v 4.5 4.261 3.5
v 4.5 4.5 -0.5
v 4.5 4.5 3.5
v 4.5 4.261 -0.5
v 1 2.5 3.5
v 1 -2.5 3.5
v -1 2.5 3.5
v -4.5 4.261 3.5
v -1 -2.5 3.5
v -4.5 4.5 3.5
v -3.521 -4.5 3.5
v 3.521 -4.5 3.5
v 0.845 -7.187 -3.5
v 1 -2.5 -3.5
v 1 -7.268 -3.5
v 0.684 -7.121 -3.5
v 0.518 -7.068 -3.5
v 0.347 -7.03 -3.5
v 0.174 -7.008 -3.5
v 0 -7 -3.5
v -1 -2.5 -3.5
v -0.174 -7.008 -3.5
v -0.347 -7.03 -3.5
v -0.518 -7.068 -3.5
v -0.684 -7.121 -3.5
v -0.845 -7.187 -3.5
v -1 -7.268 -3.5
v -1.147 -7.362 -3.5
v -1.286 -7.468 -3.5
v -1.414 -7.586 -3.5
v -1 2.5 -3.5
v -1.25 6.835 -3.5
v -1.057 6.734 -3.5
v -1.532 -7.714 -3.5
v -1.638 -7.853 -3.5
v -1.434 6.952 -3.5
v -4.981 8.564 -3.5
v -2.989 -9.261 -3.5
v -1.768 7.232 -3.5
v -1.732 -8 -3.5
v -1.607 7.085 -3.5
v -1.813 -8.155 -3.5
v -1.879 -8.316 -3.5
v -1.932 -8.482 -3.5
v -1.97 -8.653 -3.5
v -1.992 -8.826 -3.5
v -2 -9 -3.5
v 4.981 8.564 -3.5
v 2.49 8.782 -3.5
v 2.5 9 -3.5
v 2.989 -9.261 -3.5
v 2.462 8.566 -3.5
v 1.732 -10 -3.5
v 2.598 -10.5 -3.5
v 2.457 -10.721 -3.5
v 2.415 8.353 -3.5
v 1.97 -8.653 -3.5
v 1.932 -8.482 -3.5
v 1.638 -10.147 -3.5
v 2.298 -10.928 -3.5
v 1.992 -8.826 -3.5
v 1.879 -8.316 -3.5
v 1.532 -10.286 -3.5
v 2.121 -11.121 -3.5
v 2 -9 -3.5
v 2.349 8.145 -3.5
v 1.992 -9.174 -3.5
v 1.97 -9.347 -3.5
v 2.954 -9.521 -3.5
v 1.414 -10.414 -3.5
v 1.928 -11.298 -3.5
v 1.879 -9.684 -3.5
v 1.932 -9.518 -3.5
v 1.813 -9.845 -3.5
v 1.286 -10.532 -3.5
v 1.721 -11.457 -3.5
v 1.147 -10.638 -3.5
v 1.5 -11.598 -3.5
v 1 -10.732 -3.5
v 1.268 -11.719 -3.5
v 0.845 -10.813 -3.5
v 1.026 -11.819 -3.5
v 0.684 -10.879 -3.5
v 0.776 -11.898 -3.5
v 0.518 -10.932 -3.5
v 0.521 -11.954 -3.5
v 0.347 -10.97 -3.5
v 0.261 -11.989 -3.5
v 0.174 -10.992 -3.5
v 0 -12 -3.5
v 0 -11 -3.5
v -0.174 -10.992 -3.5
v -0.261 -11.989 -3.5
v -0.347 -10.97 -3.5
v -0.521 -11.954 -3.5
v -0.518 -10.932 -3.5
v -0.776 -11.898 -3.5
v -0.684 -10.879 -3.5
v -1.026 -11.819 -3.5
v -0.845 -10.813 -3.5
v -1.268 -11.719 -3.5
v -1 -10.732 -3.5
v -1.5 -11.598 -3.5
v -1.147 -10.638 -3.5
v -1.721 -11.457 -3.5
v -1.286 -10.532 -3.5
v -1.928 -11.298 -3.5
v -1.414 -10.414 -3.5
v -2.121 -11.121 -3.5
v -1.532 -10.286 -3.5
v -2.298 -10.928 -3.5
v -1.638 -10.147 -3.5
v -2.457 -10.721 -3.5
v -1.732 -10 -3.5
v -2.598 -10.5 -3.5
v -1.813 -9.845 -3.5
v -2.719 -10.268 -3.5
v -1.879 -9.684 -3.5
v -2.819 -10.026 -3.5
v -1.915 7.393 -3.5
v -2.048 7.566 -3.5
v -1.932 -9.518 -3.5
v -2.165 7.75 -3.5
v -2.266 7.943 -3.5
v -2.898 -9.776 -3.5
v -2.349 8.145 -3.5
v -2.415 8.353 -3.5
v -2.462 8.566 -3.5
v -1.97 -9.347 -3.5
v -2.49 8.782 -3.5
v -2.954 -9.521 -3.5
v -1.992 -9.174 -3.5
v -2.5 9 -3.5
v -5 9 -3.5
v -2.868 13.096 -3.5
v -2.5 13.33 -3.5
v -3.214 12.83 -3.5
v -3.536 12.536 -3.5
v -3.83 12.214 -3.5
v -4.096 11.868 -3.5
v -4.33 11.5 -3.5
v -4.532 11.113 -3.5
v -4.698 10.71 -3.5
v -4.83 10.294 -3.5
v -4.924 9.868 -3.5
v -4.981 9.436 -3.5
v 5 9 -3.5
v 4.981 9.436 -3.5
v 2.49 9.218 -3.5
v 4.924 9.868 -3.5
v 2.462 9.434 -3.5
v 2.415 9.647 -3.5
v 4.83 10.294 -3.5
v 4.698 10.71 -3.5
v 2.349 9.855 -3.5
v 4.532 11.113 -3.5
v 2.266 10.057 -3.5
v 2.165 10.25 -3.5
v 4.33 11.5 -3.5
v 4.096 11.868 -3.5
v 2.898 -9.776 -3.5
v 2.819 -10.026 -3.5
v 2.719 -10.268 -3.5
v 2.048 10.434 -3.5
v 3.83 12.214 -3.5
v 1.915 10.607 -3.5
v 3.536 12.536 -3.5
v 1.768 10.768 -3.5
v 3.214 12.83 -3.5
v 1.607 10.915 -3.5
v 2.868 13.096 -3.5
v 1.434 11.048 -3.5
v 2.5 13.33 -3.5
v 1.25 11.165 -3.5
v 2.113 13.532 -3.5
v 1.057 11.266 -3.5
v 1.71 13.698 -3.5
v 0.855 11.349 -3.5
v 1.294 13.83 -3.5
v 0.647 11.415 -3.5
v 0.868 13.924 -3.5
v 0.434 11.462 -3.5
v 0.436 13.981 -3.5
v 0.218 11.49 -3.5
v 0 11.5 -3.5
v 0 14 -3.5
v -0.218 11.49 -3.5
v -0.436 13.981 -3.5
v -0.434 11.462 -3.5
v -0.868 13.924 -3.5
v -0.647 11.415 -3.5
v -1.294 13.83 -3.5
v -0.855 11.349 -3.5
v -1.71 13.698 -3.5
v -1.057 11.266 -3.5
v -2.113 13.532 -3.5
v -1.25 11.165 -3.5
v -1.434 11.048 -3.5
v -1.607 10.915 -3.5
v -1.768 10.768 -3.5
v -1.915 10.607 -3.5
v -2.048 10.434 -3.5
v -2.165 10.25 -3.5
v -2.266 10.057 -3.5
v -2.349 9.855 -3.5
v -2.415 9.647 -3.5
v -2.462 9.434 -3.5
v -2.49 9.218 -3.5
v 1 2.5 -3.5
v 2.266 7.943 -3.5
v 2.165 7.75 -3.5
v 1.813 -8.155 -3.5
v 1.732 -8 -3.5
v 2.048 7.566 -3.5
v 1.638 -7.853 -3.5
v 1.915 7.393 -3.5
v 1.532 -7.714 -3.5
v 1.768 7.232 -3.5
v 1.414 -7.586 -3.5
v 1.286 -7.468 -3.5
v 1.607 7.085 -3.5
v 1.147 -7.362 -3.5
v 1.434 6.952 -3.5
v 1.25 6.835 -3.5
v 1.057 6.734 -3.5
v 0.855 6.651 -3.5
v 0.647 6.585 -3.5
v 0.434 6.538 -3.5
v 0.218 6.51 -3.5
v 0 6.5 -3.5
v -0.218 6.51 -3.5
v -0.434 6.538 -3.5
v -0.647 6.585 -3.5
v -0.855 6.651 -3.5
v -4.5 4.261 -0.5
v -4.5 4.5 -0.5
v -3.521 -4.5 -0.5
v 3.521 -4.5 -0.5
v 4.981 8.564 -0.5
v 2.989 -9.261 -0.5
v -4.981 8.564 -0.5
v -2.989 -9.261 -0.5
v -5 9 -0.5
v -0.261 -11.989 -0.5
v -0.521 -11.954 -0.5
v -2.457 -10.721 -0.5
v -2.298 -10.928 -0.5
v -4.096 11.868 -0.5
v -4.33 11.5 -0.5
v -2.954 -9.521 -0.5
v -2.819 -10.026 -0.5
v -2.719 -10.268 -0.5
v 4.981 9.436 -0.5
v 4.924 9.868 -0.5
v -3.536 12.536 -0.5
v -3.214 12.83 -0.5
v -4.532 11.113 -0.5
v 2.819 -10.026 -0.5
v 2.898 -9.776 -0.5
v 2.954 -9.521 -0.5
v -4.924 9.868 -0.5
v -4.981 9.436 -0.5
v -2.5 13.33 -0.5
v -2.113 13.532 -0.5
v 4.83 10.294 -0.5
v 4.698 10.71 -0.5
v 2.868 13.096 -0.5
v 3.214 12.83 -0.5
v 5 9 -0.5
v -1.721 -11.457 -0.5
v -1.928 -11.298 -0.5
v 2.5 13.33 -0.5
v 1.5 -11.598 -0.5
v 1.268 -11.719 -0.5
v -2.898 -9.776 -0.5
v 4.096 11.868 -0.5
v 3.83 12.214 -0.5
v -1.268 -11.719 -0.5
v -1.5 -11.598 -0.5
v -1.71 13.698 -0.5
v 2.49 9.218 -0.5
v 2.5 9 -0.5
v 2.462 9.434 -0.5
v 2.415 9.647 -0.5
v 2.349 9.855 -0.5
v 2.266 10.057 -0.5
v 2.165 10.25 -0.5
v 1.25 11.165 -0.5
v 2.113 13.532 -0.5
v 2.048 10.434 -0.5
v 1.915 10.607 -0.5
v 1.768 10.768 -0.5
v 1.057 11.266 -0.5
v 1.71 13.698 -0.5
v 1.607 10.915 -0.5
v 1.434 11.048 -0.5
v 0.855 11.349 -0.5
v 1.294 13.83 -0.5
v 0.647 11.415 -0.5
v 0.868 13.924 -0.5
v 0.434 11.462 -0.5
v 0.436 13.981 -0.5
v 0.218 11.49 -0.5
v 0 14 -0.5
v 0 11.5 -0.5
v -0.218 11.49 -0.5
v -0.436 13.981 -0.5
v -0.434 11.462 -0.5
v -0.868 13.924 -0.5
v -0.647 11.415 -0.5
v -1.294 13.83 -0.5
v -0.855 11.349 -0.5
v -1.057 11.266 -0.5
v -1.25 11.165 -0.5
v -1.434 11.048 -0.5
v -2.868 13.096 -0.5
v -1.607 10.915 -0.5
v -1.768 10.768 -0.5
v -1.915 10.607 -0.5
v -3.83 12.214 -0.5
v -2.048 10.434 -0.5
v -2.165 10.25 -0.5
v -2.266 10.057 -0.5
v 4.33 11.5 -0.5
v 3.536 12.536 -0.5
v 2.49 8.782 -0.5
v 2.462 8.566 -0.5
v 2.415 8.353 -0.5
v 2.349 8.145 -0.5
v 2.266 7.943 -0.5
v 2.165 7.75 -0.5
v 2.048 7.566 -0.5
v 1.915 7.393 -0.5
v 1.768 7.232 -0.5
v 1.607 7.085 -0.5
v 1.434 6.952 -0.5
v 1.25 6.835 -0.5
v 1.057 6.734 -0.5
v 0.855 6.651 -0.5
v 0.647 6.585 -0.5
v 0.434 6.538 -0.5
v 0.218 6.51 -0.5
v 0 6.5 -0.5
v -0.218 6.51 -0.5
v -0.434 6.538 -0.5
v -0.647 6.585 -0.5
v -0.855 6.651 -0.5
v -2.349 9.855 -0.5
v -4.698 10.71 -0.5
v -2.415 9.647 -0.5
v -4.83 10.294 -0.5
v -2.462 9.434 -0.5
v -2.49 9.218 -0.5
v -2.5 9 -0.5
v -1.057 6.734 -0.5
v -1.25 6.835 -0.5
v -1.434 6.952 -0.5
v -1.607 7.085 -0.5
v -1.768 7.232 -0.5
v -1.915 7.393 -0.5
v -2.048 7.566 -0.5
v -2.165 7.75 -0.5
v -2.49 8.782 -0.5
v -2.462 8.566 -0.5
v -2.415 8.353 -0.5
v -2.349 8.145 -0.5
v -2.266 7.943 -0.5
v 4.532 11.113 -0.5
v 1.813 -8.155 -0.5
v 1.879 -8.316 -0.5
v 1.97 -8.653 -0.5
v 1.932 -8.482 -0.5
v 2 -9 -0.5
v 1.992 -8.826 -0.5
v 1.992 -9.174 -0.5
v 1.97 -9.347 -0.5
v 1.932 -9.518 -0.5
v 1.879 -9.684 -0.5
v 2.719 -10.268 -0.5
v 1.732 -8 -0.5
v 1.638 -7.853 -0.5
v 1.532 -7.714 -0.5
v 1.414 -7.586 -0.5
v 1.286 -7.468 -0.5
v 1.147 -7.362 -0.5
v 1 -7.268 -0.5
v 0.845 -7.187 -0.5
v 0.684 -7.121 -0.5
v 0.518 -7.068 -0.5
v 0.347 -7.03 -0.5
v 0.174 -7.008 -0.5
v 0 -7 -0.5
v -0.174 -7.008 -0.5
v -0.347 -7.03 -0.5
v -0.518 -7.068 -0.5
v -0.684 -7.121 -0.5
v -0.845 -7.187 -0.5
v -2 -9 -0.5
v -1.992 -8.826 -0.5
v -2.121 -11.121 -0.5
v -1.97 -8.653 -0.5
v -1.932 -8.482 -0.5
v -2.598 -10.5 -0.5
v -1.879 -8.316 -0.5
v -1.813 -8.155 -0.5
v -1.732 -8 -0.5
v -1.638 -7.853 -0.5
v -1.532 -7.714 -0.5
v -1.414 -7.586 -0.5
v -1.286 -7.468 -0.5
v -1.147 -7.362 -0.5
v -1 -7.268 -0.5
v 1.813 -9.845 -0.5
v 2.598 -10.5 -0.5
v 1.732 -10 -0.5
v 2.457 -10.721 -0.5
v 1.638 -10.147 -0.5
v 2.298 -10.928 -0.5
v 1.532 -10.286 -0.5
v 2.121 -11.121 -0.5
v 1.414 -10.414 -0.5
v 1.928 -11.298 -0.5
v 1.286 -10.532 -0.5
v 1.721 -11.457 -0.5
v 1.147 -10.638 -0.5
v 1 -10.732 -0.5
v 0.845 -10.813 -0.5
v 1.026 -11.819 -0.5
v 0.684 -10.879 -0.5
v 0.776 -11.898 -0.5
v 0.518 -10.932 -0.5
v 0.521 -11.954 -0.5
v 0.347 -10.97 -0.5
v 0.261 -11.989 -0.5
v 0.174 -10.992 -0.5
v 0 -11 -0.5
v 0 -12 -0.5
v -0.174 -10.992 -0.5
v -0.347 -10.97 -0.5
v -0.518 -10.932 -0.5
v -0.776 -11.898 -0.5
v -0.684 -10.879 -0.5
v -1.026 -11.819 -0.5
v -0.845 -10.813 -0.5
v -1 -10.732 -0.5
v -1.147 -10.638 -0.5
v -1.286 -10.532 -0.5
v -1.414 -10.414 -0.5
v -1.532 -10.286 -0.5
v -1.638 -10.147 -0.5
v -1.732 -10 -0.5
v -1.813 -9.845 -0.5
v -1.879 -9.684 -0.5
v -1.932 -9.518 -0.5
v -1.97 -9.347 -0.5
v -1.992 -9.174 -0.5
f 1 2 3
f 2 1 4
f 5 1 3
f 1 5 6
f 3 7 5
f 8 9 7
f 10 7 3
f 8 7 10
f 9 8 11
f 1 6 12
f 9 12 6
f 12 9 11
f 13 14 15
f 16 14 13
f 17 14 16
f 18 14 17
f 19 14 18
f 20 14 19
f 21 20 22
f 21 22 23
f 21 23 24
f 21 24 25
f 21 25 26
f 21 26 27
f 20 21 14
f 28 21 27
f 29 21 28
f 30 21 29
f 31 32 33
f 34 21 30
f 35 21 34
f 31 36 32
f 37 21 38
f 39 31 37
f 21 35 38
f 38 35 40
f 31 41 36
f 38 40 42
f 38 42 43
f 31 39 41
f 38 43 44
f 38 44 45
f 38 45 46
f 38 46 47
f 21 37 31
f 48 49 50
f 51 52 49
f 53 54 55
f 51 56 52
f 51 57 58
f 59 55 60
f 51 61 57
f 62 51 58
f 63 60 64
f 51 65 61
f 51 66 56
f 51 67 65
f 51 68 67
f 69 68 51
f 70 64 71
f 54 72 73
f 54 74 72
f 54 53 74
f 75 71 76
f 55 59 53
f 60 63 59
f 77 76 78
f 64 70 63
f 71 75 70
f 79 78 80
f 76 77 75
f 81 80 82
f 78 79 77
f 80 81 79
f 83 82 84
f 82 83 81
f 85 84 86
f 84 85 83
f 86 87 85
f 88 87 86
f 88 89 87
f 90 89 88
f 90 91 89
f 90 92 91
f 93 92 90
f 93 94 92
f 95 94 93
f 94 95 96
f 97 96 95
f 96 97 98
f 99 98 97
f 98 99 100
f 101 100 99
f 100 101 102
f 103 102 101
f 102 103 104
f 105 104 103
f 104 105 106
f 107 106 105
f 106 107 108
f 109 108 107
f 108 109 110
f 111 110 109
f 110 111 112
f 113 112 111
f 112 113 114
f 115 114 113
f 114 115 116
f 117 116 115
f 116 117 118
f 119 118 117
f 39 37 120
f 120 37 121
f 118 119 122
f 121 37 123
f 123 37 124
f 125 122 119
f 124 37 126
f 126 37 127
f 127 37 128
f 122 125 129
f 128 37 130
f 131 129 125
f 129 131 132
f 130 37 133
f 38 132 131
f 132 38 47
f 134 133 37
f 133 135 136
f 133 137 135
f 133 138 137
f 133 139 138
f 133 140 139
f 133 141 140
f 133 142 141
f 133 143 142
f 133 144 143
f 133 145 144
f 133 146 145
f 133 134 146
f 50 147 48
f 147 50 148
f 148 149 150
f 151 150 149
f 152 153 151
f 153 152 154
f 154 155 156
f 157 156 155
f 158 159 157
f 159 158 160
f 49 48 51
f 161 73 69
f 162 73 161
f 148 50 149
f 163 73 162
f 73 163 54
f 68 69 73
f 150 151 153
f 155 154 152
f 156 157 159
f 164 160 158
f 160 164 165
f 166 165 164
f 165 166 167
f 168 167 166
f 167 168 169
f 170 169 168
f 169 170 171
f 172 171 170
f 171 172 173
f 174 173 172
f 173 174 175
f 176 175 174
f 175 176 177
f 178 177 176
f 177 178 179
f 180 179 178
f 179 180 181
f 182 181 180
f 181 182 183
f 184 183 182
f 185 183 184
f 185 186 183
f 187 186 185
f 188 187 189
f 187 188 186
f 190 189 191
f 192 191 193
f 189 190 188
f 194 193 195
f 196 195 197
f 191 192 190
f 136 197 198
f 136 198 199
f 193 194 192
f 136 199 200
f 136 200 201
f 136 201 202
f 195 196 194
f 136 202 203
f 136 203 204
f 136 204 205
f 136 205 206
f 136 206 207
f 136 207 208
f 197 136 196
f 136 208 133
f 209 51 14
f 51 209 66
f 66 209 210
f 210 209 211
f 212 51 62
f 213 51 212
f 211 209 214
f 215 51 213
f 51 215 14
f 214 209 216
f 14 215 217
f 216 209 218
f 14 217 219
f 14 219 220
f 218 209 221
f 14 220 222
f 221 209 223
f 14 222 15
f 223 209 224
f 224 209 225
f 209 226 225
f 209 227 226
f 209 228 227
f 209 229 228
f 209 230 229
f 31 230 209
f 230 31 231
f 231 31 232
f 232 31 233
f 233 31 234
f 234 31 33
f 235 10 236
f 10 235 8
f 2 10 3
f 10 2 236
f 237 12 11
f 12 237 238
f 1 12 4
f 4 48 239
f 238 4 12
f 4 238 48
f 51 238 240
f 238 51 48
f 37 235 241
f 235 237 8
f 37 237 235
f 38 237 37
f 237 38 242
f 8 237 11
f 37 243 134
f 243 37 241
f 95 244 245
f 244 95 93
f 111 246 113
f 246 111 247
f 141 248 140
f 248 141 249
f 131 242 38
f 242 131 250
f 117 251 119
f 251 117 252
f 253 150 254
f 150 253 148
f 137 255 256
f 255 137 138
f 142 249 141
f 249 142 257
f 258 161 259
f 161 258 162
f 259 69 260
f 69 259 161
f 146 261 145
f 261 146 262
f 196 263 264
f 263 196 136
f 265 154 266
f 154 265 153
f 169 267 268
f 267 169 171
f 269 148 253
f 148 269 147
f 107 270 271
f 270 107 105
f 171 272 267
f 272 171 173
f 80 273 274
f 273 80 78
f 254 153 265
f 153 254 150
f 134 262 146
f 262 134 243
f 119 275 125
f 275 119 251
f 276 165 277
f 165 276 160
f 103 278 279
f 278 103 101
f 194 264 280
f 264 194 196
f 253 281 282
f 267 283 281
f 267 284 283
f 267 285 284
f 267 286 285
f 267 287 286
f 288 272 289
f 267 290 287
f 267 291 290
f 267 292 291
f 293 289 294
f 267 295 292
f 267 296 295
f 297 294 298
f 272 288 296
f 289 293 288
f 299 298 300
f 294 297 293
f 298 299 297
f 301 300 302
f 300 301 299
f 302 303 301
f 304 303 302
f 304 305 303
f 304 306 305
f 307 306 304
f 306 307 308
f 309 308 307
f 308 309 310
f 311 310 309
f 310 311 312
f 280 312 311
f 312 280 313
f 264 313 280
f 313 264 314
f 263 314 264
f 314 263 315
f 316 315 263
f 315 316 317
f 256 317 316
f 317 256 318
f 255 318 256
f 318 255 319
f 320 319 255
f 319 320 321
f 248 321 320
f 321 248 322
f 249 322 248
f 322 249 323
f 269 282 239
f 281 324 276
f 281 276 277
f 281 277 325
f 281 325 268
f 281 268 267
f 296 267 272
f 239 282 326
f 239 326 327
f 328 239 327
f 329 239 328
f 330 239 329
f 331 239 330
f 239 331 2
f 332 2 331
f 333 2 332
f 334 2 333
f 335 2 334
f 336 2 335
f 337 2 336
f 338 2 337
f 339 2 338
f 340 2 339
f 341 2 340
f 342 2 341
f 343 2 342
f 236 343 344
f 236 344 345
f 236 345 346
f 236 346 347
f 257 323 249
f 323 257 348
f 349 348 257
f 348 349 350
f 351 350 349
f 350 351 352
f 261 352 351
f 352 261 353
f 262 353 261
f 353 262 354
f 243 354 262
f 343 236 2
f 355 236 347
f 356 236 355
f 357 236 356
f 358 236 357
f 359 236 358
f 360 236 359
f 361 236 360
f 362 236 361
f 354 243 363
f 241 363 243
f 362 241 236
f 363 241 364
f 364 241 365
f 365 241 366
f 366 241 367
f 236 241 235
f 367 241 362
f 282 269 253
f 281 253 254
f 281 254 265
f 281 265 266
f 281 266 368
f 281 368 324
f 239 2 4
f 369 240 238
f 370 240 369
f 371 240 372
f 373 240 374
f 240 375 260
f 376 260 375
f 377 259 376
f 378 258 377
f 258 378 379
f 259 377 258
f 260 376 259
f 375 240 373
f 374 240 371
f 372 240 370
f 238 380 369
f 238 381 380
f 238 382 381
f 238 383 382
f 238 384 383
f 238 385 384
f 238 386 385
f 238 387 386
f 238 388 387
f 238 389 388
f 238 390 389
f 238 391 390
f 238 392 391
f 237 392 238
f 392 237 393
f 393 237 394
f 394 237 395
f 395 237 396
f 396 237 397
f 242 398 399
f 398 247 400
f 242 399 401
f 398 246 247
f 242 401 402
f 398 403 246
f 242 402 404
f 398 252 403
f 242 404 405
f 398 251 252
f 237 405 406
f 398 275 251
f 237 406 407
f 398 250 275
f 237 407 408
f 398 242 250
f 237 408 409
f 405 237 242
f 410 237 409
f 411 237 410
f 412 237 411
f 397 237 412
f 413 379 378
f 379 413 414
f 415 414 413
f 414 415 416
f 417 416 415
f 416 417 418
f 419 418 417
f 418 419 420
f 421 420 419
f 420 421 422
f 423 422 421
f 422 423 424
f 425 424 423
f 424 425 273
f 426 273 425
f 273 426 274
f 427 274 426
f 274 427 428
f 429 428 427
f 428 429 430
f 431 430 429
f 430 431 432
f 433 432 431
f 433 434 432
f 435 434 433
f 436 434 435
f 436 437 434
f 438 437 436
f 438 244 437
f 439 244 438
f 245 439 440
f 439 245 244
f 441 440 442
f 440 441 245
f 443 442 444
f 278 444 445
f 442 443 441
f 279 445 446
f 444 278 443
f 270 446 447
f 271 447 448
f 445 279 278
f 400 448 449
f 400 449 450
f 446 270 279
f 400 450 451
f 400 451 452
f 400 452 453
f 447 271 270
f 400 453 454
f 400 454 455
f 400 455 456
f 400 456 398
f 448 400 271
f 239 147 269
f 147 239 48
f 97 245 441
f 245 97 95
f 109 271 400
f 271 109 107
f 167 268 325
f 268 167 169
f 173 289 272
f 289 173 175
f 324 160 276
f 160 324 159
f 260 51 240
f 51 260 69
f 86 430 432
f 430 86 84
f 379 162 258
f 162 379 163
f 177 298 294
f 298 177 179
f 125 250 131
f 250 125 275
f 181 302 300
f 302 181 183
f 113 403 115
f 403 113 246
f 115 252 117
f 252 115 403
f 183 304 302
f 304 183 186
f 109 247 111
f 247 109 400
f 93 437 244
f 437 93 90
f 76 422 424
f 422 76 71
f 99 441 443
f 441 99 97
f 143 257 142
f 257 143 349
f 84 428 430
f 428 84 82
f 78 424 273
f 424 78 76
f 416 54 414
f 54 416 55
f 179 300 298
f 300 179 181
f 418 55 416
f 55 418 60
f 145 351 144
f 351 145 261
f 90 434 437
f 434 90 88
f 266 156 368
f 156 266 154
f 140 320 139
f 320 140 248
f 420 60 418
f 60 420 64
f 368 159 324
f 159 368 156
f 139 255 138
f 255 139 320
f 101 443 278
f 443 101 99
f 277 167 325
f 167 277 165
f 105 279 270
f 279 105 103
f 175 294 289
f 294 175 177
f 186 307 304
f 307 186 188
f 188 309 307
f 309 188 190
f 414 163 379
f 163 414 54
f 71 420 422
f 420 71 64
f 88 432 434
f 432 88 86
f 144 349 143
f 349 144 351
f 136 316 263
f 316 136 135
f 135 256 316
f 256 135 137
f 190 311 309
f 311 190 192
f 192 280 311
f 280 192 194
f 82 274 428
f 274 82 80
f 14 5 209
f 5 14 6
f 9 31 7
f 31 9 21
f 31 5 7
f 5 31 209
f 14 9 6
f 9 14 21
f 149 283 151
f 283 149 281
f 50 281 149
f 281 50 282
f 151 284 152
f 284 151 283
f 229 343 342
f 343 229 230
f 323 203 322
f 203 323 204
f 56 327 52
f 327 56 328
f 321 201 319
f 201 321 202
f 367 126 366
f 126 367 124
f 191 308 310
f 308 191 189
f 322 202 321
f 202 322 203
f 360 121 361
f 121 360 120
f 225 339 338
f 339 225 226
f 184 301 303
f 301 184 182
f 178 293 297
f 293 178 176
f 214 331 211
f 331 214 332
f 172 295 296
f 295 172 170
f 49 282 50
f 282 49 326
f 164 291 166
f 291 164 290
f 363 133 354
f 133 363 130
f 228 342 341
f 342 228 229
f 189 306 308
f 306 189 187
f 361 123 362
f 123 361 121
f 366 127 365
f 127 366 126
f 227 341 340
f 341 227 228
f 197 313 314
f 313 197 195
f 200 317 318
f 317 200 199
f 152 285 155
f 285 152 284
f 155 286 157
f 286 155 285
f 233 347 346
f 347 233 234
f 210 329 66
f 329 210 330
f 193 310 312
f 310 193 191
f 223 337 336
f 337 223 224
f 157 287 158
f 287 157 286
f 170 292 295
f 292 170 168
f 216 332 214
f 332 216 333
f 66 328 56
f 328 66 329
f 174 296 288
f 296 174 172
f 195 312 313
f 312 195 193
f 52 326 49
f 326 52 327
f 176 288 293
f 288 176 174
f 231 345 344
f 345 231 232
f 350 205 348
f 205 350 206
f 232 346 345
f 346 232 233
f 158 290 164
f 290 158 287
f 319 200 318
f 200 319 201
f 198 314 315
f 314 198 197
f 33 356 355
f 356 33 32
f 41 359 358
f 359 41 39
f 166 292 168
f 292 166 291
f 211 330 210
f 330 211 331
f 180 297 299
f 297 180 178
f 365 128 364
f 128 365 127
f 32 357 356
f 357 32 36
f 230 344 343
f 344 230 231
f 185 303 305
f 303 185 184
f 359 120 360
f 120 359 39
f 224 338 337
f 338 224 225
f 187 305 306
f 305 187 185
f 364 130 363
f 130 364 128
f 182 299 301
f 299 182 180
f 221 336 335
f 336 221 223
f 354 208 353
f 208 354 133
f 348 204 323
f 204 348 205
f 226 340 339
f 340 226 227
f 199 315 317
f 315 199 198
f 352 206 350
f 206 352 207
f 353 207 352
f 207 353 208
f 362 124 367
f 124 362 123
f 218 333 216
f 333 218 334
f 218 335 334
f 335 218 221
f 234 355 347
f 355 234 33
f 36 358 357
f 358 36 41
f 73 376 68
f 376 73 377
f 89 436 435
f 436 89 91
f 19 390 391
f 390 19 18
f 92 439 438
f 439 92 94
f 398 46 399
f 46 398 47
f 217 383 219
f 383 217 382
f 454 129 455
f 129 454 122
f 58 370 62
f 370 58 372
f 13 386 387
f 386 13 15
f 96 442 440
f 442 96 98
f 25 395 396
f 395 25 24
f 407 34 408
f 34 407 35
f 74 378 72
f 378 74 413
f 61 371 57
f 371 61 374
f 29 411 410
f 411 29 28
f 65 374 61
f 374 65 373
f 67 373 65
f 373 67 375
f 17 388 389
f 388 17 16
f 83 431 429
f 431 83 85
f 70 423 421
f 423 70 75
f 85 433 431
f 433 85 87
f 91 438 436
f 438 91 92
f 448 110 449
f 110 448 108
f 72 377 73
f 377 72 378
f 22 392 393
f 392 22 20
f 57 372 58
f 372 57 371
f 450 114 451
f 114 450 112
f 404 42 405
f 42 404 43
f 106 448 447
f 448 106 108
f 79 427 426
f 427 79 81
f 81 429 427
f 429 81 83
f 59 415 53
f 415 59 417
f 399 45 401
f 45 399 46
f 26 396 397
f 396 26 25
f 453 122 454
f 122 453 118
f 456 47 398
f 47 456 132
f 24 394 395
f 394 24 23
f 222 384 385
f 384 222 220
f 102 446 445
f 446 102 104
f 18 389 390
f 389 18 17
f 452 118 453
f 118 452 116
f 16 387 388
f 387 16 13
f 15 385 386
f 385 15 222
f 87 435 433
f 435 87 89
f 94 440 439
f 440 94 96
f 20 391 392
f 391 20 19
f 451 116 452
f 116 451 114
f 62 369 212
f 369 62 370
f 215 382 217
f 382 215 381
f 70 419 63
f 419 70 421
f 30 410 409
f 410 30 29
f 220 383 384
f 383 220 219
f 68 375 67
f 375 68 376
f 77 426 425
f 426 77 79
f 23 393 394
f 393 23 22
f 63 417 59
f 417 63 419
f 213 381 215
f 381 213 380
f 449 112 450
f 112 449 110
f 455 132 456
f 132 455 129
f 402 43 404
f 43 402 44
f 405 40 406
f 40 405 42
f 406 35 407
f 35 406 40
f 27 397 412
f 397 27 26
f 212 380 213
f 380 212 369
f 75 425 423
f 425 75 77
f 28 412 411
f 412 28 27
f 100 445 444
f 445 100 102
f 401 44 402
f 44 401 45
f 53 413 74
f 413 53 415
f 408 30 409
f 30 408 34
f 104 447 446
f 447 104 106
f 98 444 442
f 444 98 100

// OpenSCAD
// SPDX-License-Identifier: CC-BY-SA-4.0
//
//slide potentiometer attachment
//
//Copyright (C) 2018 Peter Bennett <thelargeostrich@gmail.com>
//
//This design is licensed under a Creative Commons Attribution-ShareAlike
//4.0 International license.
//
//You are free to:
//  Share — copy and redistribute the material in any medium or format
//  Adapt — remix, transform, and build upon the material
//          for any purpose, even commercially.
//
//Under the following terms:
//
//  Attribution — You must give appropriate credit, provide a link to
//                the license, and indicate if changes were made. You
//                may do so in any reasonable manner, but not in any
//                way that suggests the licensor endorses you or your use.
//  ShareAlike  — If you remix, transform, or build upon the material,
//                you must distribute your contributions under the same
//                license as the original.
//  No additional restrictions — You may not apply legal terms or
//                technological measures that legally restrict others
//                from doing anything the license permits.

$fn=72;
module head (){
    difference(){
        union(){
            intersection(){
                cube([9,9,7], center=true);
                hull(){
                    translate([0,9,-2])
                        cylinder(r=5,h=20,center=true);
                    translate([0,-9,-2])
                        cylinder(r=3,h=20,center=true);
                };
            };
            hull(){
                translate([0,9,-2])
                    cylinder(r=5,h=3,center=true);
                translate([0,-9,-2])
                    cylinder(r=3,h=3,center=true);
            };
        };
        translate([0,0,2])
            cube([2,5,17], center=true);
        translate([0,9,-2])
            cylinder(r=2.5,h=3,center=true);
        translate([0,-9,-2])
            cylinder(r=2,h=3,center=true);
    };
}
head();
